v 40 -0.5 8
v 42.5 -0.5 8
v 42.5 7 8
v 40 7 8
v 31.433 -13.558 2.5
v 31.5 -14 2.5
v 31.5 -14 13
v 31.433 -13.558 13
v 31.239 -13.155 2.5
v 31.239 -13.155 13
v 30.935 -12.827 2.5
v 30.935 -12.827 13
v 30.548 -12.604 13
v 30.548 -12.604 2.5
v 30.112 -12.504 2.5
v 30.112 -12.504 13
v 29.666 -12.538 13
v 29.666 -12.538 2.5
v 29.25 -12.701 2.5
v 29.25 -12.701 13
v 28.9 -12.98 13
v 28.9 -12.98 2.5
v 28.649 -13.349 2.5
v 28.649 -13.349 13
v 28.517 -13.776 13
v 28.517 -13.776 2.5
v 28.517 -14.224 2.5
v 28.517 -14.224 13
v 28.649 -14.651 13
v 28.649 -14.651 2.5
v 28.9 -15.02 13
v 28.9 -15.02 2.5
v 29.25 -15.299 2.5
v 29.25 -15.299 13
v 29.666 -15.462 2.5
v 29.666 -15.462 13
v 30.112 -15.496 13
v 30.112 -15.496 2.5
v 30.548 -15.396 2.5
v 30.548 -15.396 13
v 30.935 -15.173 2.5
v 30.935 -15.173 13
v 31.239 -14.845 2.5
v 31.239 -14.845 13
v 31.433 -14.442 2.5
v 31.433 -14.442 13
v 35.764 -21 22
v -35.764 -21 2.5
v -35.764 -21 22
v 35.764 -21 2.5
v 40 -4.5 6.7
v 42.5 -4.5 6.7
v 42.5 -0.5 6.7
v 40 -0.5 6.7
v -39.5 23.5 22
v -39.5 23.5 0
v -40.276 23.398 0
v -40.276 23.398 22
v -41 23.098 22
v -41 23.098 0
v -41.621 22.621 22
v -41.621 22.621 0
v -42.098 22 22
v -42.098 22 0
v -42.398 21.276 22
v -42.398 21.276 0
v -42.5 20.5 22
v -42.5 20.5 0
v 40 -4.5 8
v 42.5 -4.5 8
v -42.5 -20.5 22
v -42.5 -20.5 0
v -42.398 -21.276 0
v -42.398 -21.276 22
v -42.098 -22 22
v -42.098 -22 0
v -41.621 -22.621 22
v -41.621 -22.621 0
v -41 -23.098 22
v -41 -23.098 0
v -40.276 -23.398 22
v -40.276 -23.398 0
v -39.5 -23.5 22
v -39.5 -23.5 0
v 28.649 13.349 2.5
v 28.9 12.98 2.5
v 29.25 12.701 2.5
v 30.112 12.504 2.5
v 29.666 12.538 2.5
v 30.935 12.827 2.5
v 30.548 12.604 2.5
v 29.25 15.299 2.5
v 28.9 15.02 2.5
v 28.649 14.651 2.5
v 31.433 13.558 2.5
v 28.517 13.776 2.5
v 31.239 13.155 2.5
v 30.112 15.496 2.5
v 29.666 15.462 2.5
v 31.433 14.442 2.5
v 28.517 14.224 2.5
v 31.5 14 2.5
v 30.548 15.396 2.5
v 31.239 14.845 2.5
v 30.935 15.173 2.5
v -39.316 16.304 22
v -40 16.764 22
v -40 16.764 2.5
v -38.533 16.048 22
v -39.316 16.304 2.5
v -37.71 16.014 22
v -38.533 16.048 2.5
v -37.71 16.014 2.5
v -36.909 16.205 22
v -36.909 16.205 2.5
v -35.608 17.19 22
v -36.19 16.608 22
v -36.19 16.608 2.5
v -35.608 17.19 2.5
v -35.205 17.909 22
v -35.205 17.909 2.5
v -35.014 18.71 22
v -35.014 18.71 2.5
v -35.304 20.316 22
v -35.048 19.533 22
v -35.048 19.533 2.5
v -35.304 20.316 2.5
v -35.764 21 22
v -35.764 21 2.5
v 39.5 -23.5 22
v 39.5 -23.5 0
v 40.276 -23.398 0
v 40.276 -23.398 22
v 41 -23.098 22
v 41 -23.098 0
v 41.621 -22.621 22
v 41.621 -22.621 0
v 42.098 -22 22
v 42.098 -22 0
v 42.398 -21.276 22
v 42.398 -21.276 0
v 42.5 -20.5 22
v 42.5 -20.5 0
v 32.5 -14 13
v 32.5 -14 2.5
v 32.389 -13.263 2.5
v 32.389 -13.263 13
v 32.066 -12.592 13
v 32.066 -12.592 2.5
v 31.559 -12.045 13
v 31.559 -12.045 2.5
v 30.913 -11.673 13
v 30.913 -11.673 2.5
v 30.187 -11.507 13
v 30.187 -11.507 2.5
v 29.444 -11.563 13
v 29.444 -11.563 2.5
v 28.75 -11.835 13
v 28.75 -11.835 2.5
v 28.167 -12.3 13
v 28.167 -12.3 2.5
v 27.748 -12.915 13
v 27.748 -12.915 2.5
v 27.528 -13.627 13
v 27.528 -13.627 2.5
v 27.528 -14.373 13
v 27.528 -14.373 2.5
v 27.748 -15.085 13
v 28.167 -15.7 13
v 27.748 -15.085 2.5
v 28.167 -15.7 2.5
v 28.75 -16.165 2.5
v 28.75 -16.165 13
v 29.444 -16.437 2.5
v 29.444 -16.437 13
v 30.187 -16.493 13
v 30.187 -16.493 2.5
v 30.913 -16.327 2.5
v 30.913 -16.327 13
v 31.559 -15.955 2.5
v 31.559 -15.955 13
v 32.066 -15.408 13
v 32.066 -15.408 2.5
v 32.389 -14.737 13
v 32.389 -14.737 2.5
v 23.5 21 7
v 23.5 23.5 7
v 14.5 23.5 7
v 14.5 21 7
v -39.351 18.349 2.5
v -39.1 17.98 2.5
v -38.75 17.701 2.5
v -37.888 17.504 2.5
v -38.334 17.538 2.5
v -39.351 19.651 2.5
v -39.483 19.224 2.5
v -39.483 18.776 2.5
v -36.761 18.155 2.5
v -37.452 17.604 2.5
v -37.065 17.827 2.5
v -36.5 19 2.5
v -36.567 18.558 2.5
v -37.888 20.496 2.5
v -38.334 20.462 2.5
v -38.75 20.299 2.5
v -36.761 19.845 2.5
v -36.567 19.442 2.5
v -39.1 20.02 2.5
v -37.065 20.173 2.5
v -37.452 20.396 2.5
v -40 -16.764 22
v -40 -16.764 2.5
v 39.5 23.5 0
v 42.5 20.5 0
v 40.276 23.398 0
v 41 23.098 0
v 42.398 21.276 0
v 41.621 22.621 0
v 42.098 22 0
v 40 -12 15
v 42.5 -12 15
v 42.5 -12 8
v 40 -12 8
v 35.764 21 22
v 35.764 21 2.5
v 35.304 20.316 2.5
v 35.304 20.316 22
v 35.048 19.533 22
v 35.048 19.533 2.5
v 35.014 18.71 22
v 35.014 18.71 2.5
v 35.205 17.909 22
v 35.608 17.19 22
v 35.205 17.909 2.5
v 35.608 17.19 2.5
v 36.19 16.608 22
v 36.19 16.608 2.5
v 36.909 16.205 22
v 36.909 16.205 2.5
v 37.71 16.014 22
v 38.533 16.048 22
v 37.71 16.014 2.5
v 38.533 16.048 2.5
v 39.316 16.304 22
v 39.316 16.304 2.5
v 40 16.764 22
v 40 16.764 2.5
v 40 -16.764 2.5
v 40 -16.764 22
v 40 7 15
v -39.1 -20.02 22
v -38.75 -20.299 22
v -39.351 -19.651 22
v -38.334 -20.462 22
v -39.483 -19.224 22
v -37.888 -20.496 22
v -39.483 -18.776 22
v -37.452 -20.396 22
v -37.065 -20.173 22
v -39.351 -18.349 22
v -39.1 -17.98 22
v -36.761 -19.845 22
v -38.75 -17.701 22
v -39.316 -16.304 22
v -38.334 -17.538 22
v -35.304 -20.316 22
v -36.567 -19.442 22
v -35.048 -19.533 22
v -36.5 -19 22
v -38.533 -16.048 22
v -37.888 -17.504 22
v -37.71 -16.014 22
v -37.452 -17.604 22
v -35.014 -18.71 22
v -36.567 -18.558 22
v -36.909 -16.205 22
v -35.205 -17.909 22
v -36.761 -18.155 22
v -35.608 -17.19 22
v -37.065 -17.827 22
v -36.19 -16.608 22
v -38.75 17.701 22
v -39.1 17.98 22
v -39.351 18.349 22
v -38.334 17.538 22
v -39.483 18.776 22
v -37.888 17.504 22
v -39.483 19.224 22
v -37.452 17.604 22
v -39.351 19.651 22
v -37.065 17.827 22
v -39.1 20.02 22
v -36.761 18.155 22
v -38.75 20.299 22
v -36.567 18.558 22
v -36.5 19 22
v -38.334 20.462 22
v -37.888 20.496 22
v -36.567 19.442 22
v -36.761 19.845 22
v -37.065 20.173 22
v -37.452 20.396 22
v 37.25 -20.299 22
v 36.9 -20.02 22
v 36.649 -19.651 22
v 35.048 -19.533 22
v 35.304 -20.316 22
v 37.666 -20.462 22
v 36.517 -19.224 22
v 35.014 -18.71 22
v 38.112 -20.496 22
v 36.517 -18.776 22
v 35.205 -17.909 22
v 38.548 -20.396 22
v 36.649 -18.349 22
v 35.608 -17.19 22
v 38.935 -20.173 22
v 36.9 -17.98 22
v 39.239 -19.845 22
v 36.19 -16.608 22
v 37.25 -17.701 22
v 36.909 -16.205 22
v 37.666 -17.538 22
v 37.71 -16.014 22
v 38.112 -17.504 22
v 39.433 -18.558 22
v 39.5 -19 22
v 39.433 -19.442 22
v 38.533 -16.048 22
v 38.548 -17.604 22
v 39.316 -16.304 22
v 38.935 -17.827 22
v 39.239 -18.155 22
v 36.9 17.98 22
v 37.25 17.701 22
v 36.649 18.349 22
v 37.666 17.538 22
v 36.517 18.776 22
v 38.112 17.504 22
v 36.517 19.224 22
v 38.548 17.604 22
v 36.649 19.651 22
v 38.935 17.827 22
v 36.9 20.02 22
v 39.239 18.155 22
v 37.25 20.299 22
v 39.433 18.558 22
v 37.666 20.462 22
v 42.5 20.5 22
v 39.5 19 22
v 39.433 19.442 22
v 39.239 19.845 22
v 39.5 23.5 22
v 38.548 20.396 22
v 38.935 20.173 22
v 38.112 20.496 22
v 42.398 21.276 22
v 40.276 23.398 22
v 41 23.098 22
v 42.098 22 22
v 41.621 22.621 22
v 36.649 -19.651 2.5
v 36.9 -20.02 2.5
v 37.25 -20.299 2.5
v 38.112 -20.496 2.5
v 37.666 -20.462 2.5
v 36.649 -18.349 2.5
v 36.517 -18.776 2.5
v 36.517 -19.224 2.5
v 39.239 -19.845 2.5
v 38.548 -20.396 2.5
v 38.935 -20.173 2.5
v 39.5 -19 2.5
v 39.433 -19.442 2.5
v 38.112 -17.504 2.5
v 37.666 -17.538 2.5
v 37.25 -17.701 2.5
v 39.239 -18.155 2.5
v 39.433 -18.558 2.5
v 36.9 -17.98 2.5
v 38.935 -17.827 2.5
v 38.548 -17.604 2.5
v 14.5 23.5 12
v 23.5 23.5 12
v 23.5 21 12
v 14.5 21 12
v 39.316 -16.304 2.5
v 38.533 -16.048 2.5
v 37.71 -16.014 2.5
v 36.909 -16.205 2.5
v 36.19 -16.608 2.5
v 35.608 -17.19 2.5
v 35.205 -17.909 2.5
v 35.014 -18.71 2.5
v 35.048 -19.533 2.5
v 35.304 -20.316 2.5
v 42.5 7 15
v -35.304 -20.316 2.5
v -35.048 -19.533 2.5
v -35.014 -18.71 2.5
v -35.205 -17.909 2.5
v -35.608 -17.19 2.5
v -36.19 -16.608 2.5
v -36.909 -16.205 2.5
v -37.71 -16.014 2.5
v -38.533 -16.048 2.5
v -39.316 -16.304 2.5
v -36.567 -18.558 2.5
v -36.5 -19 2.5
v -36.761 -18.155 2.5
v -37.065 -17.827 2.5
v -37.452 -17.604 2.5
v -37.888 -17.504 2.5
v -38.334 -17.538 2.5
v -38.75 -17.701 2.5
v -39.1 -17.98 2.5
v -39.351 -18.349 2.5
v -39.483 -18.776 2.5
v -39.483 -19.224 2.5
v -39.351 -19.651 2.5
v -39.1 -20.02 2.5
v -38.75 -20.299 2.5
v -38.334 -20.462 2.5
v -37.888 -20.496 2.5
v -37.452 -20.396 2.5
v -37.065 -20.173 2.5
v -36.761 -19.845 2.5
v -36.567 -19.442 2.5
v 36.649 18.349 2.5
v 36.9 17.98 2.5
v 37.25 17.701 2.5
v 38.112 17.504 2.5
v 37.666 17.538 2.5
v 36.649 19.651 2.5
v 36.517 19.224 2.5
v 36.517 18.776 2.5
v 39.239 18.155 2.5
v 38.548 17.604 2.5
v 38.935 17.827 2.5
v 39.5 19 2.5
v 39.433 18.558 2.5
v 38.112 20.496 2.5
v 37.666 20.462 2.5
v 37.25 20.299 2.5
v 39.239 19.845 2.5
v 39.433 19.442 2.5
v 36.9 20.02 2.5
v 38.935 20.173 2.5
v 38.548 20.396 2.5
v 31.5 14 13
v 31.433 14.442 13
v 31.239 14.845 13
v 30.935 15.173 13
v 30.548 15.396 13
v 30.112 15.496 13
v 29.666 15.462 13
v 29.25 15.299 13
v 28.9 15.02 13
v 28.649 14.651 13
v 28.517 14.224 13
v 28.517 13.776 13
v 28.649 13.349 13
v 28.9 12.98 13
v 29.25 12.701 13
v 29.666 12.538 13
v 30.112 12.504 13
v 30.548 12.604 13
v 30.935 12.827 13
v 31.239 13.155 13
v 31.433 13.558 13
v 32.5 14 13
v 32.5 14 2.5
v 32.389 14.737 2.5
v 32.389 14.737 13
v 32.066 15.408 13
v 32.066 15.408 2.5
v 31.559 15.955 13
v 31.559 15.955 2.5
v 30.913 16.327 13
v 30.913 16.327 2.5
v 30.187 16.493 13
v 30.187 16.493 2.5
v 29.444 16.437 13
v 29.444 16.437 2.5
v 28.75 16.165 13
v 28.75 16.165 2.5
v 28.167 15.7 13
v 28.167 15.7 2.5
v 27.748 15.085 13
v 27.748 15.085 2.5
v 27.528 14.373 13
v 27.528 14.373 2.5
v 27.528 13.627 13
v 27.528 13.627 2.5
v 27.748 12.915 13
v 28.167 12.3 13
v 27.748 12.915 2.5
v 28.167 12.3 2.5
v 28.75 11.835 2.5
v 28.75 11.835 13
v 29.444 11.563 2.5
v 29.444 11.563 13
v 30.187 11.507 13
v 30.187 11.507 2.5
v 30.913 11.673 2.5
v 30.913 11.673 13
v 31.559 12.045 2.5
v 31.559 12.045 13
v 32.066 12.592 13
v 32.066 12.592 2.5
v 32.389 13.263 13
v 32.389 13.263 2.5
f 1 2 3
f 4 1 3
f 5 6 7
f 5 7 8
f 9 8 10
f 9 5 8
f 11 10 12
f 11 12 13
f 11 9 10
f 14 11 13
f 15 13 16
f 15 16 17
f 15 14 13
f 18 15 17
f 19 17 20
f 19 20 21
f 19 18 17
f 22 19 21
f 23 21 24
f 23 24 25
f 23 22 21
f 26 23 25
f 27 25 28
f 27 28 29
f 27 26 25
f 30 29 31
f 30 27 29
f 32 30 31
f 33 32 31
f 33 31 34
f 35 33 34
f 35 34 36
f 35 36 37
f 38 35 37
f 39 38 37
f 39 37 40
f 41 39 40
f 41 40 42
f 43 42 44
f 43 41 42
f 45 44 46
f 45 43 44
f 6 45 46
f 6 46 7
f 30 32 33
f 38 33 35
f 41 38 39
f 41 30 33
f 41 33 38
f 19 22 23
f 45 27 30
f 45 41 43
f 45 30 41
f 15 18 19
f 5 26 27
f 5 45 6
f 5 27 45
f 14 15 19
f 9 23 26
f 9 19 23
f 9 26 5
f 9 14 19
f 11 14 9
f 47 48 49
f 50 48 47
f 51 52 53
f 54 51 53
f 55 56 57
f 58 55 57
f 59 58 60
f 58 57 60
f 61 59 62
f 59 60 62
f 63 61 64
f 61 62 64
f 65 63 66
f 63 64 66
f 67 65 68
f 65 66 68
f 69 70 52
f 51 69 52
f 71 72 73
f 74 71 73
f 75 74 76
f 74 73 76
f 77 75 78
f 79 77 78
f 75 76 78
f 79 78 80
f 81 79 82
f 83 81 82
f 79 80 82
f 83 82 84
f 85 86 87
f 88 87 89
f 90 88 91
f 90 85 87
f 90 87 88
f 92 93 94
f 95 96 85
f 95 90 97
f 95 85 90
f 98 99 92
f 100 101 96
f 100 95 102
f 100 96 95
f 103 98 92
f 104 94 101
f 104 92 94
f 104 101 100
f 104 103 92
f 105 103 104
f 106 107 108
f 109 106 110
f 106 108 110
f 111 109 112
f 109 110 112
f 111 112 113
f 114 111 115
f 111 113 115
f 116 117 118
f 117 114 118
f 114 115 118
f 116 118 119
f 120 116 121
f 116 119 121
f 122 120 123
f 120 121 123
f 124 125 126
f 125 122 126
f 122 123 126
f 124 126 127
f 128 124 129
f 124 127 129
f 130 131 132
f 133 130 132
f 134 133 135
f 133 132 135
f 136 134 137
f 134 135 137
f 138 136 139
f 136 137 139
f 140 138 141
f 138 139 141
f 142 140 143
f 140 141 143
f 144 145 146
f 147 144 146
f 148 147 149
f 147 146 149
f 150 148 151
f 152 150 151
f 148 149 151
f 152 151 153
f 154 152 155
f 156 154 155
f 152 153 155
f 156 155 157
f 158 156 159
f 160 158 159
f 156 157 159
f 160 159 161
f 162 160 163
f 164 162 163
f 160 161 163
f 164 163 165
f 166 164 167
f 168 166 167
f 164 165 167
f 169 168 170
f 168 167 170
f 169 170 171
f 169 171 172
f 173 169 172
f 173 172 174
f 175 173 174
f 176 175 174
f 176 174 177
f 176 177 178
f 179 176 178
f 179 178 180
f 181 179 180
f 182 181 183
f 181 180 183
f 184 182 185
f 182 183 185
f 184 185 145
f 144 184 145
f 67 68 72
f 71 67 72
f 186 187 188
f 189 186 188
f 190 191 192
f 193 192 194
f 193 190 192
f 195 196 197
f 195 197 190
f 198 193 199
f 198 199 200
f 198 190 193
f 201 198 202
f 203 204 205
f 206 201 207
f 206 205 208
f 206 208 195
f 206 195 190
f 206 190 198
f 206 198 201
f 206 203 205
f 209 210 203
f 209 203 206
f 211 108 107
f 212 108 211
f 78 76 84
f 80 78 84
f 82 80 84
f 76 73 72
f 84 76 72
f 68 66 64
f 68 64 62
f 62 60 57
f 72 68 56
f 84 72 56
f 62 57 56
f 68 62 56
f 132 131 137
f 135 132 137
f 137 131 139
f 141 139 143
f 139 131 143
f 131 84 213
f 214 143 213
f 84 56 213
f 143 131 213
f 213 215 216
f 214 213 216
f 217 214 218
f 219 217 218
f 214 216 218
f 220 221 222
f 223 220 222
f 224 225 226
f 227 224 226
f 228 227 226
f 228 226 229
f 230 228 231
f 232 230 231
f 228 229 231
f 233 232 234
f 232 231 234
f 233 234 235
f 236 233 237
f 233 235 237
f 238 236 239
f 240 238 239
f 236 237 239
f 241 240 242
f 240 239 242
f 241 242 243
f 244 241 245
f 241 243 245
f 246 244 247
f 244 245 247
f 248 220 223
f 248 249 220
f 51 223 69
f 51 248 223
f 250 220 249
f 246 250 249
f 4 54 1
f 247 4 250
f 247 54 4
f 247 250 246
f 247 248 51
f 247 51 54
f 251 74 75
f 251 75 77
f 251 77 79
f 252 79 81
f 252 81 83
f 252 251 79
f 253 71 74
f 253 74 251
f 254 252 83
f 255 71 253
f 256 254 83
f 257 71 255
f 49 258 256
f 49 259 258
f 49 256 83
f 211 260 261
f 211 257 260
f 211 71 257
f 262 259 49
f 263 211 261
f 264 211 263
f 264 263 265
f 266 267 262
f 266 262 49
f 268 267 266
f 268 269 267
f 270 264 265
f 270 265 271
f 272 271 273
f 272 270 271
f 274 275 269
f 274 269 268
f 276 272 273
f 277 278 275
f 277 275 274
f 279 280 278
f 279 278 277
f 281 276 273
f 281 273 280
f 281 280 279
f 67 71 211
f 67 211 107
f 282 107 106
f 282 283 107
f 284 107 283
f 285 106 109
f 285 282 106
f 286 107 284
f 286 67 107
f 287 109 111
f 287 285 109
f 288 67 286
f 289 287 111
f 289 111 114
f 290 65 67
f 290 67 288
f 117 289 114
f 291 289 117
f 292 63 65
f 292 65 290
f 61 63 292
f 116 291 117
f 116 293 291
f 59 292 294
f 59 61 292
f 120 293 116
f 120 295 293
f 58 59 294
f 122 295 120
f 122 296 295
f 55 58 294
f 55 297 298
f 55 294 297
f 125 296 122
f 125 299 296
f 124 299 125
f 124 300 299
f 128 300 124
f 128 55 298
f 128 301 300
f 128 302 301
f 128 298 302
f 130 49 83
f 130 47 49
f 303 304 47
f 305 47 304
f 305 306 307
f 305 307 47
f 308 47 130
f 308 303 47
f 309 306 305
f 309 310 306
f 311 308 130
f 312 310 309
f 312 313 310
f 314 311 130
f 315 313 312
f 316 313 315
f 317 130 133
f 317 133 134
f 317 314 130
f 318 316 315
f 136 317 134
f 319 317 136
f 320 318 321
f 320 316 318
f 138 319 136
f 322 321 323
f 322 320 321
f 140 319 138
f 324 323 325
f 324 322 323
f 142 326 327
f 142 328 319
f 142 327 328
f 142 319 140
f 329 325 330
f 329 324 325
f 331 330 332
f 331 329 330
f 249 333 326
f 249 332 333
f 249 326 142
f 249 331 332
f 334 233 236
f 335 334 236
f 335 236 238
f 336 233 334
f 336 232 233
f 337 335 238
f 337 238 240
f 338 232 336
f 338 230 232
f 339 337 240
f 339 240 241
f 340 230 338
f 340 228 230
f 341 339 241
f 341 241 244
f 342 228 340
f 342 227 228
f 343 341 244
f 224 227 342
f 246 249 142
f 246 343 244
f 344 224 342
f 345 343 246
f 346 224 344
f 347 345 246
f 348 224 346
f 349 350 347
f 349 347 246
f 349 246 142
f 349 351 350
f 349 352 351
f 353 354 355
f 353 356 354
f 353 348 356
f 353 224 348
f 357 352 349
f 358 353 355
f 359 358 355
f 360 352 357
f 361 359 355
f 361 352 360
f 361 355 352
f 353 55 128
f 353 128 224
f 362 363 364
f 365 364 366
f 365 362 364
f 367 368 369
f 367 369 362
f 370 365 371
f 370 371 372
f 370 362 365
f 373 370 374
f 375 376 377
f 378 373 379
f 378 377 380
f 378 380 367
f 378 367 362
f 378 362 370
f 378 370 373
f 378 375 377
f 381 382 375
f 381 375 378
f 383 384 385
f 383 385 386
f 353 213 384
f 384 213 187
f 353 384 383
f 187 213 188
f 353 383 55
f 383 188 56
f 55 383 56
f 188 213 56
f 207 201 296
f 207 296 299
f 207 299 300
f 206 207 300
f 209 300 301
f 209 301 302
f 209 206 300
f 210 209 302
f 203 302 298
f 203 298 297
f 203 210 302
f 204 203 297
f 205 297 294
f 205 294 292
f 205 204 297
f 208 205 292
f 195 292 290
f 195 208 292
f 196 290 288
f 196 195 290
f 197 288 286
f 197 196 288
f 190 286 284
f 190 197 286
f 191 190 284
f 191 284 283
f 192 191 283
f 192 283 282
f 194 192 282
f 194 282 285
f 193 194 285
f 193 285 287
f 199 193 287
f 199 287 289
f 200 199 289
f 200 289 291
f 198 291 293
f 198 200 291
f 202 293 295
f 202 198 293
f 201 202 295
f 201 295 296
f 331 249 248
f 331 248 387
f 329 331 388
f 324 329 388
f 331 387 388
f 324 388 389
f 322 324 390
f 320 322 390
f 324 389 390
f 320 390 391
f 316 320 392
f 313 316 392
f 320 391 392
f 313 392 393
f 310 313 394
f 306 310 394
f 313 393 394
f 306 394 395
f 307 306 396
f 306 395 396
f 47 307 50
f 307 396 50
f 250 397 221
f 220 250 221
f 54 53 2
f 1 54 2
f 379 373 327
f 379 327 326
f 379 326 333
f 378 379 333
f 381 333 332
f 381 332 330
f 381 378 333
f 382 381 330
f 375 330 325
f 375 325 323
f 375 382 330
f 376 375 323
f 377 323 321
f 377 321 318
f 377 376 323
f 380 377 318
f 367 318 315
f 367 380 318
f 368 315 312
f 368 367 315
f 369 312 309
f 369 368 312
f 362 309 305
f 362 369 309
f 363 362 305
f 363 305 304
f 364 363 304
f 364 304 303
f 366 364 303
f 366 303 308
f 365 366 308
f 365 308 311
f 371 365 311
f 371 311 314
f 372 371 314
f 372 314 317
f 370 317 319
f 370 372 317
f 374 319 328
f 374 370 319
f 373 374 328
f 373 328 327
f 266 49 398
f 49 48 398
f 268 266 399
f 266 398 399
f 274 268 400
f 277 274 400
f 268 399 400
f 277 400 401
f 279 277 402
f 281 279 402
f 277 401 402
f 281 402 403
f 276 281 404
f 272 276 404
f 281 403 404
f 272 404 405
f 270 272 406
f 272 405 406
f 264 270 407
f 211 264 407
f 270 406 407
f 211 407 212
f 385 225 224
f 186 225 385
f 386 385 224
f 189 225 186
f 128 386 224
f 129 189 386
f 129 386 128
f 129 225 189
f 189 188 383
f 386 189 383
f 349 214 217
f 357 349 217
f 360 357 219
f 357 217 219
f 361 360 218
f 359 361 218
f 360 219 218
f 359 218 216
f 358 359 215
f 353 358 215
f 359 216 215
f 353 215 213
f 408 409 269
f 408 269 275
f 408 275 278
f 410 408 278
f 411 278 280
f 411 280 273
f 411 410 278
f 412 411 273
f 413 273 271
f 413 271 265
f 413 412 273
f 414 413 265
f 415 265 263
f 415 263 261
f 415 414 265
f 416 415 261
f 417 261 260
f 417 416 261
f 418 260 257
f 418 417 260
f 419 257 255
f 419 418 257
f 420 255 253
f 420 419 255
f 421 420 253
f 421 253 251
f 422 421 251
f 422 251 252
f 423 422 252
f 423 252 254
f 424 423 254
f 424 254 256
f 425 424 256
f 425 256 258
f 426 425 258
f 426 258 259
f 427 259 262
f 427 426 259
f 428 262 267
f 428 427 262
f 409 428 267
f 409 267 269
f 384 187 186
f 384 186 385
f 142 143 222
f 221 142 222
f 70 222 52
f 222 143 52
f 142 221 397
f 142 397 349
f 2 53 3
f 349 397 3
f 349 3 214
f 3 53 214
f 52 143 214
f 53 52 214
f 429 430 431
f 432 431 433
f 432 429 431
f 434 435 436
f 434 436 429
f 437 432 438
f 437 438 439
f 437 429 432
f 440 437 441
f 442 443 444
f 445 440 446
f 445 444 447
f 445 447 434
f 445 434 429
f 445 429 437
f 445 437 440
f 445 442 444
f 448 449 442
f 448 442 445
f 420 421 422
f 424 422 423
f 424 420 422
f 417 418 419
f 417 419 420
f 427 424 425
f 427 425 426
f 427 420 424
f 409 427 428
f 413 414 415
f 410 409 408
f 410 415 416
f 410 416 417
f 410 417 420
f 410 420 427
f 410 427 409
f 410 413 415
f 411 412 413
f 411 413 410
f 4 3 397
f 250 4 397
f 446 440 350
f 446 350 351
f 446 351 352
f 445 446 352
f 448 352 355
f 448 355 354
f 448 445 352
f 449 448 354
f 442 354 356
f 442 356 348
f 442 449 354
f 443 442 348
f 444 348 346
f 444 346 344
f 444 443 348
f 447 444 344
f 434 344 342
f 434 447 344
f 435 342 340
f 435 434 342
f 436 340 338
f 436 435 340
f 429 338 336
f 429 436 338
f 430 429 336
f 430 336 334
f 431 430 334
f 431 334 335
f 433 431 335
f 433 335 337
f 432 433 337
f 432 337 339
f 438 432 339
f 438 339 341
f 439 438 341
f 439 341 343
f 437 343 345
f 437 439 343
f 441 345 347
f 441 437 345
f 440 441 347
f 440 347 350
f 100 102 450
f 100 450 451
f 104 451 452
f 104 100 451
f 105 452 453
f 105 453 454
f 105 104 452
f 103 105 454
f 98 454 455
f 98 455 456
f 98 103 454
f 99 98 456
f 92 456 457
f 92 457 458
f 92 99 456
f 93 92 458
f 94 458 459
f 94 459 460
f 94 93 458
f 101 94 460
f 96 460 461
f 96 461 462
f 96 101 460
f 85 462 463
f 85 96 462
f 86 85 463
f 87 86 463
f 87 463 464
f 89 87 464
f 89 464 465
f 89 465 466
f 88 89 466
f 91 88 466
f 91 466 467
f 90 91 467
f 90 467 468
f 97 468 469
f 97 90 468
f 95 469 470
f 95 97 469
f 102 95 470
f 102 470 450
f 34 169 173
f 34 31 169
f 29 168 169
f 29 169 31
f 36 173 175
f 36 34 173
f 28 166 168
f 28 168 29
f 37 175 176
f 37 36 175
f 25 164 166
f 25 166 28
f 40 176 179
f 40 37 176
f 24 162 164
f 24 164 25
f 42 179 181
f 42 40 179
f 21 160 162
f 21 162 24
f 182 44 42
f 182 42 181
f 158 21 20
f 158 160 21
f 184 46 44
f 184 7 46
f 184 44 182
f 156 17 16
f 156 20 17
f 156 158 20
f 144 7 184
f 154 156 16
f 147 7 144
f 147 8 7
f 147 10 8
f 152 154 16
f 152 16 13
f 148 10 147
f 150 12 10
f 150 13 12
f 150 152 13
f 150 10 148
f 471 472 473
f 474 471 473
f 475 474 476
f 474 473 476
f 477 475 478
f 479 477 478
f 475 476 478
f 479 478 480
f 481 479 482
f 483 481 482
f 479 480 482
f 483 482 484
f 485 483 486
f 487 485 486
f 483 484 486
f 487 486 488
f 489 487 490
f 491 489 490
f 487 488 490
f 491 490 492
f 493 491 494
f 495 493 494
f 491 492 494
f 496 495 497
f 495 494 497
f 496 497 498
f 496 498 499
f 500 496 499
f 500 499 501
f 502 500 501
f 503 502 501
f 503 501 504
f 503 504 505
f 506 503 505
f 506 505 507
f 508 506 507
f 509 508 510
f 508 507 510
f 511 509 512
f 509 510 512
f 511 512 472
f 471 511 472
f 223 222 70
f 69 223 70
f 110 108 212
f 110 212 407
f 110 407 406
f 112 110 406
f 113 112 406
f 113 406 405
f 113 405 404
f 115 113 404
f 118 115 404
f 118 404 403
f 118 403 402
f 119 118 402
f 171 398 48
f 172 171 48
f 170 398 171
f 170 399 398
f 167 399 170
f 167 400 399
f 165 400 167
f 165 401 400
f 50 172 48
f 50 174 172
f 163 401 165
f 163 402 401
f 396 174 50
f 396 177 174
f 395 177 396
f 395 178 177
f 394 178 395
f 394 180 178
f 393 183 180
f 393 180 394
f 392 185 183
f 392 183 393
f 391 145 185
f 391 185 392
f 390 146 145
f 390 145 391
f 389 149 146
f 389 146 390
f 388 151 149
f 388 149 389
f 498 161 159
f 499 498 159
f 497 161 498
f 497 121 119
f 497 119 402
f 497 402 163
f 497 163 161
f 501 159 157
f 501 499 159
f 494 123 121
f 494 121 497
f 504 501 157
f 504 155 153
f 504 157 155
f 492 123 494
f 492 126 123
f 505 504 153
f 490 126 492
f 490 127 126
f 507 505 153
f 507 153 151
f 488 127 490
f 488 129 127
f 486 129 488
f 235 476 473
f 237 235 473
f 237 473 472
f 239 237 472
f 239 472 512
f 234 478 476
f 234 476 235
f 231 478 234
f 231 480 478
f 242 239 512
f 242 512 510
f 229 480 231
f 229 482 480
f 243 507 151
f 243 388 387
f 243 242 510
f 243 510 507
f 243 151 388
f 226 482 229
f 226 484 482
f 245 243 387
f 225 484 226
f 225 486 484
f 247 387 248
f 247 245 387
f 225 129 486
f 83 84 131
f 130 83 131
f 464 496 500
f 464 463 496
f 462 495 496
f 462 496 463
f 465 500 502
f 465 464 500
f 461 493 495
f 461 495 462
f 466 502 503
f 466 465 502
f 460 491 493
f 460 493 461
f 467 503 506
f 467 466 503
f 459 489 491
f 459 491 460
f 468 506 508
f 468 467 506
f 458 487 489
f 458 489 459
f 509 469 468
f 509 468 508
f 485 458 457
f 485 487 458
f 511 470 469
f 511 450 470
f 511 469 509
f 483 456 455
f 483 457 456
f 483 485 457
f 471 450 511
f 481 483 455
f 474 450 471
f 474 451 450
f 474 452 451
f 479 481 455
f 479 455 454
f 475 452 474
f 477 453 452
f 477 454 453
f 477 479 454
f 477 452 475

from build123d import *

# Parameters (mm, degrees)
F1_DEPTH  = 22
F2_T      = -2.5
F3_R      = 3
F3_R_2    = 1.4999993145
F4_DEPTH  = 19.5
F6_DEPTH  = 2.5
F7_W      = 9
F7_H      = 5
F8_DEPTH  = 2.5
F9_R      = 2.5
F9_R_2    = 1.5
F10_DEPTH = 10.5


with BuildPart() as f1:
    # F0 (on Top) → F1 (new body)
    with BuildSketch(Plane.XY):
        with BuildLine():
            ThreePointArc((42.5, 20.5), (41.6213203436, 22.6213203436), (39.5, 23.5))
            Line((39.5, 23.5), (-39.5, 23.5))
            ThreePointArc((-39.5, 23.5), (-41.6213203436, 22.6213203436), (-42.5, 20.5))
            Line((-42.5, 20.5), (-42.5, -20.5))
            ThreePointArc((-42.5, -20.5), (-41.6213203436, -22.6213203436), (-39.5, -23.5))
            Line((-39.5, -23.5), (39.5, -23.5))
            ThreePointArc((39.5, -23.5), (41.6213203436, -22.6213203436), (42.5, -20.5))
            Line((42.5, -20.5), (42.5, 20.5))
        make_face()
    extrude(amount=F1_DEPTH)

    # F2
    f2_openings = [f1.faces().sort_by_distance(p)[0] for p in [
        (0, 0, 22),
    ]]
    offset(amount=F2_T, openings=f2_openings)

    # F3 (on face) → F4 (join, through all)
    with BuildSketch(Plane.XY.offset(2.5)):
        with Locations((-38, 19)):
            Circle(F3_R)
        with Locations((-38, 19)):
            Circle(F3_R_2, mode=Mode.SUBTRACT)
        with Locations((38, 19)):
            Circle(F3_R)
        with Locations((38, 19)):
            Circle(F3_R_2, mode=Mode.SUBTRACT)
        with Locations((38, -19)):
            Circle(F3_R)
        with Locations((38, -19)):
            Circle(F3_R_2, mode=Mode.SUBTRACT)
        with Locations((-38, -19)):
            Circle(F3_R)
        with Locations((-38, -19)):
            Circle(F3_R_2, mode=Mode.SUBTRACT)
    extrude(amount=F4_DEPTH)

    # F5 (on face) → F6 (cut, through all)
    with BuildSketch(Plane.YZ.offset(42.5)):
        Polygon((7, 15), (-12, 15), (-12, 8), (-4.5, 8), (-4.5, 6.7), (-0.5, 6.7), (-0.5, 8), (7, 8), align=None)
    extrude(amount=-F6_DEPTH, mode=Mode.SUBTRACT)

    # F7 (on face) → F8 (cut, through all)
    with BuildSketch(Plane(origin=(0, 23.5, 0), x_dir=(-1, 0, 0), z_dir=(0, 1, 0))):
        with Locations((-19, 9.5)):
            Rectangle(F7_W, F7_H)
    extrude(amount=-F8_DEPTH, mode=Mode.SUBTRACT)

    # F9 (on face) → F10 (join)
    with BuildSketch(Plane.XY.offset(2.5)):
        with Locations((30, 14)):
            Circle(F9_R)
        with Locations((30, 14)):
            Circle(F9_R_2, mode=Mode.SUBTRACT)
        with Locations((30, -14)):
            Circle(F9_R)
        with Locations((30, -14)):
            Circle(F9_R_2, mode=Mode.SUBTRACT)
    extrude(amount=F10_DEPTH)


solid = f1.part
